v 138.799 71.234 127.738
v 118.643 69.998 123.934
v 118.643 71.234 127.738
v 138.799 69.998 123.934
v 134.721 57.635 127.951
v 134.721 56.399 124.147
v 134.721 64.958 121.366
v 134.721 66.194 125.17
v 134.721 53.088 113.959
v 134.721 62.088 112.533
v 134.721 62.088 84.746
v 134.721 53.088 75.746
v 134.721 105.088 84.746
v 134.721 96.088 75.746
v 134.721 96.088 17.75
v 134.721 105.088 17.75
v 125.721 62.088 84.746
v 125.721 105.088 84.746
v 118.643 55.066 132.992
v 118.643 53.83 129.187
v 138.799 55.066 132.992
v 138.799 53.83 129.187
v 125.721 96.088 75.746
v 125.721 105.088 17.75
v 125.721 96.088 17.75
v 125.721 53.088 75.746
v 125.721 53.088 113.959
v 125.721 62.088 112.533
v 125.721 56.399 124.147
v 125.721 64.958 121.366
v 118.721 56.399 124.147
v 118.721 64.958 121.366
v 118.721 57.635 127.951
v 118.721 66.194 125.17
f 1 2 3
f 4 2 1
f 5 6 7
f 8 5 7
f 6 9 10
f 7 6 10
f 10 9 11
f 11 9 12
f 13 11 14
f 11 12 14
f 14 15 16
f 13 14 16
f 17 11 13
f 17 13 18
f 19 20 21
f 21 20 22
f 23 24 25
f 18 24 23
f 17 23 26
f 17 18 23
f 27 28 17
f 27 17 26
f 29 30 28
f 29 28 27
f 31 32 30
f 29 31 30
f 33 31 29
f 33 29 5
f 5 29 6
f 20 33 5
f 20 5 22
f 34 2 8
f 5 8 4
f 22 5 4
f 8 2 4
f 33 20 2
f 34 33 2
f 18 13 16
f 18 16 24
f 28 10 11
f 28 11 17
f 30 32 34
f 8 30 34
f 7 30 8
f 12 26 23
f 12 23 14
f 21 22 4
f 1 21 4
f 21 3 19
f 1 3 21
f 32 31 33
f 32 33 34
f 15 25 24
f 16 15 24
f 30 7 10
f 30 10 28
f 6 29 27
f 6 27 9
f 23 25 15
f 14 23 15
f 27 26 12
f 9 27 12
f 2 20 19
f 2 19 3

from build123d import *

# Parameters (mm, degrees)
CUT_EXTRUDE3_START         = -17.750008032
CUT_EXTRUDE3_OUTLINE_W     = 3.00000608
CUT_EXTRUDE3_OUTLINE_H     = 30.000001192
CUT_EXTRUDE3_OUTLINE_W_2   = 2.999998629
CUT_EXTRUDE3_DEPTH         = 17.750008032
CUT_EXTRUDE3_2_OUTLINE_W   = 9.999990463
CUT_EXTRUDE3_2_OUTLINE_H   = 30.000001192
CUT_EXTRUDE3_2_OUTLINE_W_2 = 10.000005364
CUT_EXTRUDE3_2_DEPTH       = 3.000000026
CUT_EXTRUDE3_START_2       = -3.000000492
CUT_EXTRUDE3_3_OUTLINE_W   = 12.49999553
CUT_EXTRUDE3_3_OUTLINE_H   = 30.000001192
CUT_EXTRUDE3_3_DEPTH       = 3.000000492
CUT_EXTRUDE3_START_3       = 85.588127375
CUT_EXTRUDE3_4_DEPTH       = 30.000001192
SKETCH7_W                  = 9
SKETCH7_H                  = 9
SKETCH11_W                 = 16.000001486
SKETCH11_H                 = 9
BOSS_EXTRUDE5_DEPTH        = 4
SKETCH12_W                 = 20.155891034
SKETCH12_H                 = 17
BOSS_EXTRUDE6_DEPTH        = 4
CUT_EXTRUDE4_DEPTH         = 20
CUT_EXTRUDE4_DEPTH_BACK    = 20
SKETCH13_W                 = 17.750008032
SKETCH13_H                 = 30.000001192


with BuildPart() as part:
    # Cut-Extrude3: read off the stored shape, not the designer's step
    # Cut-Extrude3 outline → Cut-Extrude3 (new body)
    with BuildSketch(Plane.XY.offset(17.750008032).offset(CUT_EXTRUDE3_START)):
        with Locations((137.970902026, 100.588127971)):
            Rectangle(CUT_EXTRUDE3_OUTLINE_W, CUT_EXTRUDE3_OUTLINE_H)
        with Locations((122.470904142, 100.588127971)):
            Rectangle(CUT_EXTRUDE3_OUTLINE_W_2, CUT_EXTRUDE3_OUTLINE_H)
    extrude(amount=CUT_EXTRUDE3_DEPTH)

    # Cut-Extrude3 2 outline → Cut-Extrude3 2 (add)
    # profile 1 of 2: a face of its own
    with BuildSketch(Plane.XY.offset(17.750008032).offset(CUT_EXTRUDE3_START)):
        with Locations((144.470900298, 100.588127971)):
            Rectangle(CUT_EXTRUDE3_2_OUTLINE_W, CUT_EXTRUDE3_2_OUTLINE_H)
        Polygon((146.020904183, 100.58812052), (145.813241601, 99.813126028), (145.24589479, 99.245779216), (144.470900297, 99.038124084), (143.695905805, 99.245779216), (143.128573895, 99.813126028), (142.920896411, 100.58812052), (143.128573895, 101.363122463), (143.695905805, 101.930469275), (144.470900297, 102.138124406), (145.24589479, 101.930469275), (145.813241601, 101.363122463), align=None, mode=Mode.SUBTRACT)
    # profile 2 of 2: a face of its own
    with BuildSketch(Plane.XY.offset(17.750008032).offset(CUT_EXTRUDE3_START)):
        with Locations((115.970902145, 100.588127971)):
            Rectangle(CUT_EXTRUDE3_2_OUTLINE_W_2, CUT_EXTRUDE3_2_OUTLINE_H)
        Polygon((114.628560841, 101.363122463), (115.195907652, 101.930469275), (115.970902145, 102.138124406), (116.745904088, 101.930469275), (117.313250899, 101.363122463), (117.520906031, 100.58812052), (117.313250899, 99.813126028), (116.745904088, 99.245779216), (115.970902145, 99.038124084), (115.195907652, 99.245779216), (114.628560841, 99.813126028), (114.420905709, 100.58812052), align=None, mode=Mode.SUBTRACT)
    extrude(amount=CUT_EXTRUDE3_2_DEPTH)

    # Cut-Extrude3 3 outline → Cut-Extrude3 3 (add)
    with BuildSketch(Plane.XY.offset(17.750008032).offset(CUT_EXTRUDE3_START_2)):
        with Locations((130.220901221, 100.588127971)):
            Rectangle(CUT_EXTRUDE3_3_OUTLINE_W, CUT_EXTRUDE3_3_OUTLINE_H)
    extrude(amount=CUT_EXTRUDE3_3_DEPTH)

    # Cut-Extrude3 4 outline → Cut-Extrude3 4 (add)
    with BuildSketch(Plane(origin=(0, 0, 0), x_dir=(1, 0, 0), z_dir=(0, 1, 0)).offset(CUT_EXTRUDE3_START_3)):
        Polygon((139.738842845, -4.00000019), (140.470907092, -3.267952008), (141.470894217, -3.000000026), (139.470905066, -3.000000026), (139.470905066, -5.000007804), align=None)
        Polygon((118.970900774, -3.000000026), (119.970902801, -3.267952008), (120.702959597, -4.00000019), (120.970904827, -5.000007804), (120.970904827, -3.000000026), align=None)
    extrude(amount=CUT_EXTRUDE3_4_DEPTH)

    # Sweep1: sweep along a path in Sketch5
    with BuildLine(Plane(origin=(130.220903456, 0, 0), x_dir=(0, 0, -1), z_dir=(1, 0, 0))) as sweep1_path:
        Line((-17.750008032, 100.588127971), (-80.246052562, 100.588127971))
        Line((-80.246052562, 100.588127971), (-80.246052562, 57.588127971))
        Line((-80.246052562, 57.588127971), (-113.246052562, 57.588127971))
        Line((-113.246052562, 57.588127971), (-122.756617725, 60.678297914))
    # Sketch7 → Sweep1 (sweep)
    with BuildSketch(Plane.XY.offset(17.750008032)):
        with Locations((130.220904946, 100.588127971)):
            Rectangle(SKETCH7_W, SKETCH7_H)
    sweep(path=sweep1_path.line, transition=Transition.RIGHT)

    # Sketch11 → Boss-Extrude5 (add)
    with BuildSketch(Plane(origin=(0, 41.871526616, 128.867308142), x_dir=(1, 0, 0), z_dir=(0, 0.30901699437494257, 0.9510565162951552))):
        with Locations((126.720904203, 19.77460958)):
            Rectangle(SKETCH11_W, SKETCH11_H)
    extrude(amount=BOSS_EXTRUDE5_DEPTH)

    # Sketch12 → Boss-Extrude6 (add)
    with BuildSketch(Plane(origin=(0, 43.107594593, 132.671534207), x_dir=(1, 0, 0), z_dir=(0, 0.3090169943749432, 0.951056516295155))):
        with Locations((128.72090495, 19.77460958)):
            Rectangle(SKETCH12_W, SKETCH12_H)
    extrude(amount=BOSS_EXTRUDE6_DEPTH)

    # Sketch13 → Cut-Extrude4 (cut, two sides: drawn at the far end of the back side and taken through both)
    with BuildSketch(Plane(origin=(130.220903456, 0, 0), x_dir=(0, 0, -1), z_dir=(1, 0, 0)).offset(-CUT_EXTRUDE4_DEPTH_BACK)):
        with Locations((-8.875004016, 100.588127971)):
            Rectangle(SKETCH13_W, SKETCH13_H)
    extrude(amount=CUT_EXTRUDE4_DEPTH + CUT_EXTRUDE4_DEPTH_BACK, mode=Mode.SUBTRACT)


solid = part.part
